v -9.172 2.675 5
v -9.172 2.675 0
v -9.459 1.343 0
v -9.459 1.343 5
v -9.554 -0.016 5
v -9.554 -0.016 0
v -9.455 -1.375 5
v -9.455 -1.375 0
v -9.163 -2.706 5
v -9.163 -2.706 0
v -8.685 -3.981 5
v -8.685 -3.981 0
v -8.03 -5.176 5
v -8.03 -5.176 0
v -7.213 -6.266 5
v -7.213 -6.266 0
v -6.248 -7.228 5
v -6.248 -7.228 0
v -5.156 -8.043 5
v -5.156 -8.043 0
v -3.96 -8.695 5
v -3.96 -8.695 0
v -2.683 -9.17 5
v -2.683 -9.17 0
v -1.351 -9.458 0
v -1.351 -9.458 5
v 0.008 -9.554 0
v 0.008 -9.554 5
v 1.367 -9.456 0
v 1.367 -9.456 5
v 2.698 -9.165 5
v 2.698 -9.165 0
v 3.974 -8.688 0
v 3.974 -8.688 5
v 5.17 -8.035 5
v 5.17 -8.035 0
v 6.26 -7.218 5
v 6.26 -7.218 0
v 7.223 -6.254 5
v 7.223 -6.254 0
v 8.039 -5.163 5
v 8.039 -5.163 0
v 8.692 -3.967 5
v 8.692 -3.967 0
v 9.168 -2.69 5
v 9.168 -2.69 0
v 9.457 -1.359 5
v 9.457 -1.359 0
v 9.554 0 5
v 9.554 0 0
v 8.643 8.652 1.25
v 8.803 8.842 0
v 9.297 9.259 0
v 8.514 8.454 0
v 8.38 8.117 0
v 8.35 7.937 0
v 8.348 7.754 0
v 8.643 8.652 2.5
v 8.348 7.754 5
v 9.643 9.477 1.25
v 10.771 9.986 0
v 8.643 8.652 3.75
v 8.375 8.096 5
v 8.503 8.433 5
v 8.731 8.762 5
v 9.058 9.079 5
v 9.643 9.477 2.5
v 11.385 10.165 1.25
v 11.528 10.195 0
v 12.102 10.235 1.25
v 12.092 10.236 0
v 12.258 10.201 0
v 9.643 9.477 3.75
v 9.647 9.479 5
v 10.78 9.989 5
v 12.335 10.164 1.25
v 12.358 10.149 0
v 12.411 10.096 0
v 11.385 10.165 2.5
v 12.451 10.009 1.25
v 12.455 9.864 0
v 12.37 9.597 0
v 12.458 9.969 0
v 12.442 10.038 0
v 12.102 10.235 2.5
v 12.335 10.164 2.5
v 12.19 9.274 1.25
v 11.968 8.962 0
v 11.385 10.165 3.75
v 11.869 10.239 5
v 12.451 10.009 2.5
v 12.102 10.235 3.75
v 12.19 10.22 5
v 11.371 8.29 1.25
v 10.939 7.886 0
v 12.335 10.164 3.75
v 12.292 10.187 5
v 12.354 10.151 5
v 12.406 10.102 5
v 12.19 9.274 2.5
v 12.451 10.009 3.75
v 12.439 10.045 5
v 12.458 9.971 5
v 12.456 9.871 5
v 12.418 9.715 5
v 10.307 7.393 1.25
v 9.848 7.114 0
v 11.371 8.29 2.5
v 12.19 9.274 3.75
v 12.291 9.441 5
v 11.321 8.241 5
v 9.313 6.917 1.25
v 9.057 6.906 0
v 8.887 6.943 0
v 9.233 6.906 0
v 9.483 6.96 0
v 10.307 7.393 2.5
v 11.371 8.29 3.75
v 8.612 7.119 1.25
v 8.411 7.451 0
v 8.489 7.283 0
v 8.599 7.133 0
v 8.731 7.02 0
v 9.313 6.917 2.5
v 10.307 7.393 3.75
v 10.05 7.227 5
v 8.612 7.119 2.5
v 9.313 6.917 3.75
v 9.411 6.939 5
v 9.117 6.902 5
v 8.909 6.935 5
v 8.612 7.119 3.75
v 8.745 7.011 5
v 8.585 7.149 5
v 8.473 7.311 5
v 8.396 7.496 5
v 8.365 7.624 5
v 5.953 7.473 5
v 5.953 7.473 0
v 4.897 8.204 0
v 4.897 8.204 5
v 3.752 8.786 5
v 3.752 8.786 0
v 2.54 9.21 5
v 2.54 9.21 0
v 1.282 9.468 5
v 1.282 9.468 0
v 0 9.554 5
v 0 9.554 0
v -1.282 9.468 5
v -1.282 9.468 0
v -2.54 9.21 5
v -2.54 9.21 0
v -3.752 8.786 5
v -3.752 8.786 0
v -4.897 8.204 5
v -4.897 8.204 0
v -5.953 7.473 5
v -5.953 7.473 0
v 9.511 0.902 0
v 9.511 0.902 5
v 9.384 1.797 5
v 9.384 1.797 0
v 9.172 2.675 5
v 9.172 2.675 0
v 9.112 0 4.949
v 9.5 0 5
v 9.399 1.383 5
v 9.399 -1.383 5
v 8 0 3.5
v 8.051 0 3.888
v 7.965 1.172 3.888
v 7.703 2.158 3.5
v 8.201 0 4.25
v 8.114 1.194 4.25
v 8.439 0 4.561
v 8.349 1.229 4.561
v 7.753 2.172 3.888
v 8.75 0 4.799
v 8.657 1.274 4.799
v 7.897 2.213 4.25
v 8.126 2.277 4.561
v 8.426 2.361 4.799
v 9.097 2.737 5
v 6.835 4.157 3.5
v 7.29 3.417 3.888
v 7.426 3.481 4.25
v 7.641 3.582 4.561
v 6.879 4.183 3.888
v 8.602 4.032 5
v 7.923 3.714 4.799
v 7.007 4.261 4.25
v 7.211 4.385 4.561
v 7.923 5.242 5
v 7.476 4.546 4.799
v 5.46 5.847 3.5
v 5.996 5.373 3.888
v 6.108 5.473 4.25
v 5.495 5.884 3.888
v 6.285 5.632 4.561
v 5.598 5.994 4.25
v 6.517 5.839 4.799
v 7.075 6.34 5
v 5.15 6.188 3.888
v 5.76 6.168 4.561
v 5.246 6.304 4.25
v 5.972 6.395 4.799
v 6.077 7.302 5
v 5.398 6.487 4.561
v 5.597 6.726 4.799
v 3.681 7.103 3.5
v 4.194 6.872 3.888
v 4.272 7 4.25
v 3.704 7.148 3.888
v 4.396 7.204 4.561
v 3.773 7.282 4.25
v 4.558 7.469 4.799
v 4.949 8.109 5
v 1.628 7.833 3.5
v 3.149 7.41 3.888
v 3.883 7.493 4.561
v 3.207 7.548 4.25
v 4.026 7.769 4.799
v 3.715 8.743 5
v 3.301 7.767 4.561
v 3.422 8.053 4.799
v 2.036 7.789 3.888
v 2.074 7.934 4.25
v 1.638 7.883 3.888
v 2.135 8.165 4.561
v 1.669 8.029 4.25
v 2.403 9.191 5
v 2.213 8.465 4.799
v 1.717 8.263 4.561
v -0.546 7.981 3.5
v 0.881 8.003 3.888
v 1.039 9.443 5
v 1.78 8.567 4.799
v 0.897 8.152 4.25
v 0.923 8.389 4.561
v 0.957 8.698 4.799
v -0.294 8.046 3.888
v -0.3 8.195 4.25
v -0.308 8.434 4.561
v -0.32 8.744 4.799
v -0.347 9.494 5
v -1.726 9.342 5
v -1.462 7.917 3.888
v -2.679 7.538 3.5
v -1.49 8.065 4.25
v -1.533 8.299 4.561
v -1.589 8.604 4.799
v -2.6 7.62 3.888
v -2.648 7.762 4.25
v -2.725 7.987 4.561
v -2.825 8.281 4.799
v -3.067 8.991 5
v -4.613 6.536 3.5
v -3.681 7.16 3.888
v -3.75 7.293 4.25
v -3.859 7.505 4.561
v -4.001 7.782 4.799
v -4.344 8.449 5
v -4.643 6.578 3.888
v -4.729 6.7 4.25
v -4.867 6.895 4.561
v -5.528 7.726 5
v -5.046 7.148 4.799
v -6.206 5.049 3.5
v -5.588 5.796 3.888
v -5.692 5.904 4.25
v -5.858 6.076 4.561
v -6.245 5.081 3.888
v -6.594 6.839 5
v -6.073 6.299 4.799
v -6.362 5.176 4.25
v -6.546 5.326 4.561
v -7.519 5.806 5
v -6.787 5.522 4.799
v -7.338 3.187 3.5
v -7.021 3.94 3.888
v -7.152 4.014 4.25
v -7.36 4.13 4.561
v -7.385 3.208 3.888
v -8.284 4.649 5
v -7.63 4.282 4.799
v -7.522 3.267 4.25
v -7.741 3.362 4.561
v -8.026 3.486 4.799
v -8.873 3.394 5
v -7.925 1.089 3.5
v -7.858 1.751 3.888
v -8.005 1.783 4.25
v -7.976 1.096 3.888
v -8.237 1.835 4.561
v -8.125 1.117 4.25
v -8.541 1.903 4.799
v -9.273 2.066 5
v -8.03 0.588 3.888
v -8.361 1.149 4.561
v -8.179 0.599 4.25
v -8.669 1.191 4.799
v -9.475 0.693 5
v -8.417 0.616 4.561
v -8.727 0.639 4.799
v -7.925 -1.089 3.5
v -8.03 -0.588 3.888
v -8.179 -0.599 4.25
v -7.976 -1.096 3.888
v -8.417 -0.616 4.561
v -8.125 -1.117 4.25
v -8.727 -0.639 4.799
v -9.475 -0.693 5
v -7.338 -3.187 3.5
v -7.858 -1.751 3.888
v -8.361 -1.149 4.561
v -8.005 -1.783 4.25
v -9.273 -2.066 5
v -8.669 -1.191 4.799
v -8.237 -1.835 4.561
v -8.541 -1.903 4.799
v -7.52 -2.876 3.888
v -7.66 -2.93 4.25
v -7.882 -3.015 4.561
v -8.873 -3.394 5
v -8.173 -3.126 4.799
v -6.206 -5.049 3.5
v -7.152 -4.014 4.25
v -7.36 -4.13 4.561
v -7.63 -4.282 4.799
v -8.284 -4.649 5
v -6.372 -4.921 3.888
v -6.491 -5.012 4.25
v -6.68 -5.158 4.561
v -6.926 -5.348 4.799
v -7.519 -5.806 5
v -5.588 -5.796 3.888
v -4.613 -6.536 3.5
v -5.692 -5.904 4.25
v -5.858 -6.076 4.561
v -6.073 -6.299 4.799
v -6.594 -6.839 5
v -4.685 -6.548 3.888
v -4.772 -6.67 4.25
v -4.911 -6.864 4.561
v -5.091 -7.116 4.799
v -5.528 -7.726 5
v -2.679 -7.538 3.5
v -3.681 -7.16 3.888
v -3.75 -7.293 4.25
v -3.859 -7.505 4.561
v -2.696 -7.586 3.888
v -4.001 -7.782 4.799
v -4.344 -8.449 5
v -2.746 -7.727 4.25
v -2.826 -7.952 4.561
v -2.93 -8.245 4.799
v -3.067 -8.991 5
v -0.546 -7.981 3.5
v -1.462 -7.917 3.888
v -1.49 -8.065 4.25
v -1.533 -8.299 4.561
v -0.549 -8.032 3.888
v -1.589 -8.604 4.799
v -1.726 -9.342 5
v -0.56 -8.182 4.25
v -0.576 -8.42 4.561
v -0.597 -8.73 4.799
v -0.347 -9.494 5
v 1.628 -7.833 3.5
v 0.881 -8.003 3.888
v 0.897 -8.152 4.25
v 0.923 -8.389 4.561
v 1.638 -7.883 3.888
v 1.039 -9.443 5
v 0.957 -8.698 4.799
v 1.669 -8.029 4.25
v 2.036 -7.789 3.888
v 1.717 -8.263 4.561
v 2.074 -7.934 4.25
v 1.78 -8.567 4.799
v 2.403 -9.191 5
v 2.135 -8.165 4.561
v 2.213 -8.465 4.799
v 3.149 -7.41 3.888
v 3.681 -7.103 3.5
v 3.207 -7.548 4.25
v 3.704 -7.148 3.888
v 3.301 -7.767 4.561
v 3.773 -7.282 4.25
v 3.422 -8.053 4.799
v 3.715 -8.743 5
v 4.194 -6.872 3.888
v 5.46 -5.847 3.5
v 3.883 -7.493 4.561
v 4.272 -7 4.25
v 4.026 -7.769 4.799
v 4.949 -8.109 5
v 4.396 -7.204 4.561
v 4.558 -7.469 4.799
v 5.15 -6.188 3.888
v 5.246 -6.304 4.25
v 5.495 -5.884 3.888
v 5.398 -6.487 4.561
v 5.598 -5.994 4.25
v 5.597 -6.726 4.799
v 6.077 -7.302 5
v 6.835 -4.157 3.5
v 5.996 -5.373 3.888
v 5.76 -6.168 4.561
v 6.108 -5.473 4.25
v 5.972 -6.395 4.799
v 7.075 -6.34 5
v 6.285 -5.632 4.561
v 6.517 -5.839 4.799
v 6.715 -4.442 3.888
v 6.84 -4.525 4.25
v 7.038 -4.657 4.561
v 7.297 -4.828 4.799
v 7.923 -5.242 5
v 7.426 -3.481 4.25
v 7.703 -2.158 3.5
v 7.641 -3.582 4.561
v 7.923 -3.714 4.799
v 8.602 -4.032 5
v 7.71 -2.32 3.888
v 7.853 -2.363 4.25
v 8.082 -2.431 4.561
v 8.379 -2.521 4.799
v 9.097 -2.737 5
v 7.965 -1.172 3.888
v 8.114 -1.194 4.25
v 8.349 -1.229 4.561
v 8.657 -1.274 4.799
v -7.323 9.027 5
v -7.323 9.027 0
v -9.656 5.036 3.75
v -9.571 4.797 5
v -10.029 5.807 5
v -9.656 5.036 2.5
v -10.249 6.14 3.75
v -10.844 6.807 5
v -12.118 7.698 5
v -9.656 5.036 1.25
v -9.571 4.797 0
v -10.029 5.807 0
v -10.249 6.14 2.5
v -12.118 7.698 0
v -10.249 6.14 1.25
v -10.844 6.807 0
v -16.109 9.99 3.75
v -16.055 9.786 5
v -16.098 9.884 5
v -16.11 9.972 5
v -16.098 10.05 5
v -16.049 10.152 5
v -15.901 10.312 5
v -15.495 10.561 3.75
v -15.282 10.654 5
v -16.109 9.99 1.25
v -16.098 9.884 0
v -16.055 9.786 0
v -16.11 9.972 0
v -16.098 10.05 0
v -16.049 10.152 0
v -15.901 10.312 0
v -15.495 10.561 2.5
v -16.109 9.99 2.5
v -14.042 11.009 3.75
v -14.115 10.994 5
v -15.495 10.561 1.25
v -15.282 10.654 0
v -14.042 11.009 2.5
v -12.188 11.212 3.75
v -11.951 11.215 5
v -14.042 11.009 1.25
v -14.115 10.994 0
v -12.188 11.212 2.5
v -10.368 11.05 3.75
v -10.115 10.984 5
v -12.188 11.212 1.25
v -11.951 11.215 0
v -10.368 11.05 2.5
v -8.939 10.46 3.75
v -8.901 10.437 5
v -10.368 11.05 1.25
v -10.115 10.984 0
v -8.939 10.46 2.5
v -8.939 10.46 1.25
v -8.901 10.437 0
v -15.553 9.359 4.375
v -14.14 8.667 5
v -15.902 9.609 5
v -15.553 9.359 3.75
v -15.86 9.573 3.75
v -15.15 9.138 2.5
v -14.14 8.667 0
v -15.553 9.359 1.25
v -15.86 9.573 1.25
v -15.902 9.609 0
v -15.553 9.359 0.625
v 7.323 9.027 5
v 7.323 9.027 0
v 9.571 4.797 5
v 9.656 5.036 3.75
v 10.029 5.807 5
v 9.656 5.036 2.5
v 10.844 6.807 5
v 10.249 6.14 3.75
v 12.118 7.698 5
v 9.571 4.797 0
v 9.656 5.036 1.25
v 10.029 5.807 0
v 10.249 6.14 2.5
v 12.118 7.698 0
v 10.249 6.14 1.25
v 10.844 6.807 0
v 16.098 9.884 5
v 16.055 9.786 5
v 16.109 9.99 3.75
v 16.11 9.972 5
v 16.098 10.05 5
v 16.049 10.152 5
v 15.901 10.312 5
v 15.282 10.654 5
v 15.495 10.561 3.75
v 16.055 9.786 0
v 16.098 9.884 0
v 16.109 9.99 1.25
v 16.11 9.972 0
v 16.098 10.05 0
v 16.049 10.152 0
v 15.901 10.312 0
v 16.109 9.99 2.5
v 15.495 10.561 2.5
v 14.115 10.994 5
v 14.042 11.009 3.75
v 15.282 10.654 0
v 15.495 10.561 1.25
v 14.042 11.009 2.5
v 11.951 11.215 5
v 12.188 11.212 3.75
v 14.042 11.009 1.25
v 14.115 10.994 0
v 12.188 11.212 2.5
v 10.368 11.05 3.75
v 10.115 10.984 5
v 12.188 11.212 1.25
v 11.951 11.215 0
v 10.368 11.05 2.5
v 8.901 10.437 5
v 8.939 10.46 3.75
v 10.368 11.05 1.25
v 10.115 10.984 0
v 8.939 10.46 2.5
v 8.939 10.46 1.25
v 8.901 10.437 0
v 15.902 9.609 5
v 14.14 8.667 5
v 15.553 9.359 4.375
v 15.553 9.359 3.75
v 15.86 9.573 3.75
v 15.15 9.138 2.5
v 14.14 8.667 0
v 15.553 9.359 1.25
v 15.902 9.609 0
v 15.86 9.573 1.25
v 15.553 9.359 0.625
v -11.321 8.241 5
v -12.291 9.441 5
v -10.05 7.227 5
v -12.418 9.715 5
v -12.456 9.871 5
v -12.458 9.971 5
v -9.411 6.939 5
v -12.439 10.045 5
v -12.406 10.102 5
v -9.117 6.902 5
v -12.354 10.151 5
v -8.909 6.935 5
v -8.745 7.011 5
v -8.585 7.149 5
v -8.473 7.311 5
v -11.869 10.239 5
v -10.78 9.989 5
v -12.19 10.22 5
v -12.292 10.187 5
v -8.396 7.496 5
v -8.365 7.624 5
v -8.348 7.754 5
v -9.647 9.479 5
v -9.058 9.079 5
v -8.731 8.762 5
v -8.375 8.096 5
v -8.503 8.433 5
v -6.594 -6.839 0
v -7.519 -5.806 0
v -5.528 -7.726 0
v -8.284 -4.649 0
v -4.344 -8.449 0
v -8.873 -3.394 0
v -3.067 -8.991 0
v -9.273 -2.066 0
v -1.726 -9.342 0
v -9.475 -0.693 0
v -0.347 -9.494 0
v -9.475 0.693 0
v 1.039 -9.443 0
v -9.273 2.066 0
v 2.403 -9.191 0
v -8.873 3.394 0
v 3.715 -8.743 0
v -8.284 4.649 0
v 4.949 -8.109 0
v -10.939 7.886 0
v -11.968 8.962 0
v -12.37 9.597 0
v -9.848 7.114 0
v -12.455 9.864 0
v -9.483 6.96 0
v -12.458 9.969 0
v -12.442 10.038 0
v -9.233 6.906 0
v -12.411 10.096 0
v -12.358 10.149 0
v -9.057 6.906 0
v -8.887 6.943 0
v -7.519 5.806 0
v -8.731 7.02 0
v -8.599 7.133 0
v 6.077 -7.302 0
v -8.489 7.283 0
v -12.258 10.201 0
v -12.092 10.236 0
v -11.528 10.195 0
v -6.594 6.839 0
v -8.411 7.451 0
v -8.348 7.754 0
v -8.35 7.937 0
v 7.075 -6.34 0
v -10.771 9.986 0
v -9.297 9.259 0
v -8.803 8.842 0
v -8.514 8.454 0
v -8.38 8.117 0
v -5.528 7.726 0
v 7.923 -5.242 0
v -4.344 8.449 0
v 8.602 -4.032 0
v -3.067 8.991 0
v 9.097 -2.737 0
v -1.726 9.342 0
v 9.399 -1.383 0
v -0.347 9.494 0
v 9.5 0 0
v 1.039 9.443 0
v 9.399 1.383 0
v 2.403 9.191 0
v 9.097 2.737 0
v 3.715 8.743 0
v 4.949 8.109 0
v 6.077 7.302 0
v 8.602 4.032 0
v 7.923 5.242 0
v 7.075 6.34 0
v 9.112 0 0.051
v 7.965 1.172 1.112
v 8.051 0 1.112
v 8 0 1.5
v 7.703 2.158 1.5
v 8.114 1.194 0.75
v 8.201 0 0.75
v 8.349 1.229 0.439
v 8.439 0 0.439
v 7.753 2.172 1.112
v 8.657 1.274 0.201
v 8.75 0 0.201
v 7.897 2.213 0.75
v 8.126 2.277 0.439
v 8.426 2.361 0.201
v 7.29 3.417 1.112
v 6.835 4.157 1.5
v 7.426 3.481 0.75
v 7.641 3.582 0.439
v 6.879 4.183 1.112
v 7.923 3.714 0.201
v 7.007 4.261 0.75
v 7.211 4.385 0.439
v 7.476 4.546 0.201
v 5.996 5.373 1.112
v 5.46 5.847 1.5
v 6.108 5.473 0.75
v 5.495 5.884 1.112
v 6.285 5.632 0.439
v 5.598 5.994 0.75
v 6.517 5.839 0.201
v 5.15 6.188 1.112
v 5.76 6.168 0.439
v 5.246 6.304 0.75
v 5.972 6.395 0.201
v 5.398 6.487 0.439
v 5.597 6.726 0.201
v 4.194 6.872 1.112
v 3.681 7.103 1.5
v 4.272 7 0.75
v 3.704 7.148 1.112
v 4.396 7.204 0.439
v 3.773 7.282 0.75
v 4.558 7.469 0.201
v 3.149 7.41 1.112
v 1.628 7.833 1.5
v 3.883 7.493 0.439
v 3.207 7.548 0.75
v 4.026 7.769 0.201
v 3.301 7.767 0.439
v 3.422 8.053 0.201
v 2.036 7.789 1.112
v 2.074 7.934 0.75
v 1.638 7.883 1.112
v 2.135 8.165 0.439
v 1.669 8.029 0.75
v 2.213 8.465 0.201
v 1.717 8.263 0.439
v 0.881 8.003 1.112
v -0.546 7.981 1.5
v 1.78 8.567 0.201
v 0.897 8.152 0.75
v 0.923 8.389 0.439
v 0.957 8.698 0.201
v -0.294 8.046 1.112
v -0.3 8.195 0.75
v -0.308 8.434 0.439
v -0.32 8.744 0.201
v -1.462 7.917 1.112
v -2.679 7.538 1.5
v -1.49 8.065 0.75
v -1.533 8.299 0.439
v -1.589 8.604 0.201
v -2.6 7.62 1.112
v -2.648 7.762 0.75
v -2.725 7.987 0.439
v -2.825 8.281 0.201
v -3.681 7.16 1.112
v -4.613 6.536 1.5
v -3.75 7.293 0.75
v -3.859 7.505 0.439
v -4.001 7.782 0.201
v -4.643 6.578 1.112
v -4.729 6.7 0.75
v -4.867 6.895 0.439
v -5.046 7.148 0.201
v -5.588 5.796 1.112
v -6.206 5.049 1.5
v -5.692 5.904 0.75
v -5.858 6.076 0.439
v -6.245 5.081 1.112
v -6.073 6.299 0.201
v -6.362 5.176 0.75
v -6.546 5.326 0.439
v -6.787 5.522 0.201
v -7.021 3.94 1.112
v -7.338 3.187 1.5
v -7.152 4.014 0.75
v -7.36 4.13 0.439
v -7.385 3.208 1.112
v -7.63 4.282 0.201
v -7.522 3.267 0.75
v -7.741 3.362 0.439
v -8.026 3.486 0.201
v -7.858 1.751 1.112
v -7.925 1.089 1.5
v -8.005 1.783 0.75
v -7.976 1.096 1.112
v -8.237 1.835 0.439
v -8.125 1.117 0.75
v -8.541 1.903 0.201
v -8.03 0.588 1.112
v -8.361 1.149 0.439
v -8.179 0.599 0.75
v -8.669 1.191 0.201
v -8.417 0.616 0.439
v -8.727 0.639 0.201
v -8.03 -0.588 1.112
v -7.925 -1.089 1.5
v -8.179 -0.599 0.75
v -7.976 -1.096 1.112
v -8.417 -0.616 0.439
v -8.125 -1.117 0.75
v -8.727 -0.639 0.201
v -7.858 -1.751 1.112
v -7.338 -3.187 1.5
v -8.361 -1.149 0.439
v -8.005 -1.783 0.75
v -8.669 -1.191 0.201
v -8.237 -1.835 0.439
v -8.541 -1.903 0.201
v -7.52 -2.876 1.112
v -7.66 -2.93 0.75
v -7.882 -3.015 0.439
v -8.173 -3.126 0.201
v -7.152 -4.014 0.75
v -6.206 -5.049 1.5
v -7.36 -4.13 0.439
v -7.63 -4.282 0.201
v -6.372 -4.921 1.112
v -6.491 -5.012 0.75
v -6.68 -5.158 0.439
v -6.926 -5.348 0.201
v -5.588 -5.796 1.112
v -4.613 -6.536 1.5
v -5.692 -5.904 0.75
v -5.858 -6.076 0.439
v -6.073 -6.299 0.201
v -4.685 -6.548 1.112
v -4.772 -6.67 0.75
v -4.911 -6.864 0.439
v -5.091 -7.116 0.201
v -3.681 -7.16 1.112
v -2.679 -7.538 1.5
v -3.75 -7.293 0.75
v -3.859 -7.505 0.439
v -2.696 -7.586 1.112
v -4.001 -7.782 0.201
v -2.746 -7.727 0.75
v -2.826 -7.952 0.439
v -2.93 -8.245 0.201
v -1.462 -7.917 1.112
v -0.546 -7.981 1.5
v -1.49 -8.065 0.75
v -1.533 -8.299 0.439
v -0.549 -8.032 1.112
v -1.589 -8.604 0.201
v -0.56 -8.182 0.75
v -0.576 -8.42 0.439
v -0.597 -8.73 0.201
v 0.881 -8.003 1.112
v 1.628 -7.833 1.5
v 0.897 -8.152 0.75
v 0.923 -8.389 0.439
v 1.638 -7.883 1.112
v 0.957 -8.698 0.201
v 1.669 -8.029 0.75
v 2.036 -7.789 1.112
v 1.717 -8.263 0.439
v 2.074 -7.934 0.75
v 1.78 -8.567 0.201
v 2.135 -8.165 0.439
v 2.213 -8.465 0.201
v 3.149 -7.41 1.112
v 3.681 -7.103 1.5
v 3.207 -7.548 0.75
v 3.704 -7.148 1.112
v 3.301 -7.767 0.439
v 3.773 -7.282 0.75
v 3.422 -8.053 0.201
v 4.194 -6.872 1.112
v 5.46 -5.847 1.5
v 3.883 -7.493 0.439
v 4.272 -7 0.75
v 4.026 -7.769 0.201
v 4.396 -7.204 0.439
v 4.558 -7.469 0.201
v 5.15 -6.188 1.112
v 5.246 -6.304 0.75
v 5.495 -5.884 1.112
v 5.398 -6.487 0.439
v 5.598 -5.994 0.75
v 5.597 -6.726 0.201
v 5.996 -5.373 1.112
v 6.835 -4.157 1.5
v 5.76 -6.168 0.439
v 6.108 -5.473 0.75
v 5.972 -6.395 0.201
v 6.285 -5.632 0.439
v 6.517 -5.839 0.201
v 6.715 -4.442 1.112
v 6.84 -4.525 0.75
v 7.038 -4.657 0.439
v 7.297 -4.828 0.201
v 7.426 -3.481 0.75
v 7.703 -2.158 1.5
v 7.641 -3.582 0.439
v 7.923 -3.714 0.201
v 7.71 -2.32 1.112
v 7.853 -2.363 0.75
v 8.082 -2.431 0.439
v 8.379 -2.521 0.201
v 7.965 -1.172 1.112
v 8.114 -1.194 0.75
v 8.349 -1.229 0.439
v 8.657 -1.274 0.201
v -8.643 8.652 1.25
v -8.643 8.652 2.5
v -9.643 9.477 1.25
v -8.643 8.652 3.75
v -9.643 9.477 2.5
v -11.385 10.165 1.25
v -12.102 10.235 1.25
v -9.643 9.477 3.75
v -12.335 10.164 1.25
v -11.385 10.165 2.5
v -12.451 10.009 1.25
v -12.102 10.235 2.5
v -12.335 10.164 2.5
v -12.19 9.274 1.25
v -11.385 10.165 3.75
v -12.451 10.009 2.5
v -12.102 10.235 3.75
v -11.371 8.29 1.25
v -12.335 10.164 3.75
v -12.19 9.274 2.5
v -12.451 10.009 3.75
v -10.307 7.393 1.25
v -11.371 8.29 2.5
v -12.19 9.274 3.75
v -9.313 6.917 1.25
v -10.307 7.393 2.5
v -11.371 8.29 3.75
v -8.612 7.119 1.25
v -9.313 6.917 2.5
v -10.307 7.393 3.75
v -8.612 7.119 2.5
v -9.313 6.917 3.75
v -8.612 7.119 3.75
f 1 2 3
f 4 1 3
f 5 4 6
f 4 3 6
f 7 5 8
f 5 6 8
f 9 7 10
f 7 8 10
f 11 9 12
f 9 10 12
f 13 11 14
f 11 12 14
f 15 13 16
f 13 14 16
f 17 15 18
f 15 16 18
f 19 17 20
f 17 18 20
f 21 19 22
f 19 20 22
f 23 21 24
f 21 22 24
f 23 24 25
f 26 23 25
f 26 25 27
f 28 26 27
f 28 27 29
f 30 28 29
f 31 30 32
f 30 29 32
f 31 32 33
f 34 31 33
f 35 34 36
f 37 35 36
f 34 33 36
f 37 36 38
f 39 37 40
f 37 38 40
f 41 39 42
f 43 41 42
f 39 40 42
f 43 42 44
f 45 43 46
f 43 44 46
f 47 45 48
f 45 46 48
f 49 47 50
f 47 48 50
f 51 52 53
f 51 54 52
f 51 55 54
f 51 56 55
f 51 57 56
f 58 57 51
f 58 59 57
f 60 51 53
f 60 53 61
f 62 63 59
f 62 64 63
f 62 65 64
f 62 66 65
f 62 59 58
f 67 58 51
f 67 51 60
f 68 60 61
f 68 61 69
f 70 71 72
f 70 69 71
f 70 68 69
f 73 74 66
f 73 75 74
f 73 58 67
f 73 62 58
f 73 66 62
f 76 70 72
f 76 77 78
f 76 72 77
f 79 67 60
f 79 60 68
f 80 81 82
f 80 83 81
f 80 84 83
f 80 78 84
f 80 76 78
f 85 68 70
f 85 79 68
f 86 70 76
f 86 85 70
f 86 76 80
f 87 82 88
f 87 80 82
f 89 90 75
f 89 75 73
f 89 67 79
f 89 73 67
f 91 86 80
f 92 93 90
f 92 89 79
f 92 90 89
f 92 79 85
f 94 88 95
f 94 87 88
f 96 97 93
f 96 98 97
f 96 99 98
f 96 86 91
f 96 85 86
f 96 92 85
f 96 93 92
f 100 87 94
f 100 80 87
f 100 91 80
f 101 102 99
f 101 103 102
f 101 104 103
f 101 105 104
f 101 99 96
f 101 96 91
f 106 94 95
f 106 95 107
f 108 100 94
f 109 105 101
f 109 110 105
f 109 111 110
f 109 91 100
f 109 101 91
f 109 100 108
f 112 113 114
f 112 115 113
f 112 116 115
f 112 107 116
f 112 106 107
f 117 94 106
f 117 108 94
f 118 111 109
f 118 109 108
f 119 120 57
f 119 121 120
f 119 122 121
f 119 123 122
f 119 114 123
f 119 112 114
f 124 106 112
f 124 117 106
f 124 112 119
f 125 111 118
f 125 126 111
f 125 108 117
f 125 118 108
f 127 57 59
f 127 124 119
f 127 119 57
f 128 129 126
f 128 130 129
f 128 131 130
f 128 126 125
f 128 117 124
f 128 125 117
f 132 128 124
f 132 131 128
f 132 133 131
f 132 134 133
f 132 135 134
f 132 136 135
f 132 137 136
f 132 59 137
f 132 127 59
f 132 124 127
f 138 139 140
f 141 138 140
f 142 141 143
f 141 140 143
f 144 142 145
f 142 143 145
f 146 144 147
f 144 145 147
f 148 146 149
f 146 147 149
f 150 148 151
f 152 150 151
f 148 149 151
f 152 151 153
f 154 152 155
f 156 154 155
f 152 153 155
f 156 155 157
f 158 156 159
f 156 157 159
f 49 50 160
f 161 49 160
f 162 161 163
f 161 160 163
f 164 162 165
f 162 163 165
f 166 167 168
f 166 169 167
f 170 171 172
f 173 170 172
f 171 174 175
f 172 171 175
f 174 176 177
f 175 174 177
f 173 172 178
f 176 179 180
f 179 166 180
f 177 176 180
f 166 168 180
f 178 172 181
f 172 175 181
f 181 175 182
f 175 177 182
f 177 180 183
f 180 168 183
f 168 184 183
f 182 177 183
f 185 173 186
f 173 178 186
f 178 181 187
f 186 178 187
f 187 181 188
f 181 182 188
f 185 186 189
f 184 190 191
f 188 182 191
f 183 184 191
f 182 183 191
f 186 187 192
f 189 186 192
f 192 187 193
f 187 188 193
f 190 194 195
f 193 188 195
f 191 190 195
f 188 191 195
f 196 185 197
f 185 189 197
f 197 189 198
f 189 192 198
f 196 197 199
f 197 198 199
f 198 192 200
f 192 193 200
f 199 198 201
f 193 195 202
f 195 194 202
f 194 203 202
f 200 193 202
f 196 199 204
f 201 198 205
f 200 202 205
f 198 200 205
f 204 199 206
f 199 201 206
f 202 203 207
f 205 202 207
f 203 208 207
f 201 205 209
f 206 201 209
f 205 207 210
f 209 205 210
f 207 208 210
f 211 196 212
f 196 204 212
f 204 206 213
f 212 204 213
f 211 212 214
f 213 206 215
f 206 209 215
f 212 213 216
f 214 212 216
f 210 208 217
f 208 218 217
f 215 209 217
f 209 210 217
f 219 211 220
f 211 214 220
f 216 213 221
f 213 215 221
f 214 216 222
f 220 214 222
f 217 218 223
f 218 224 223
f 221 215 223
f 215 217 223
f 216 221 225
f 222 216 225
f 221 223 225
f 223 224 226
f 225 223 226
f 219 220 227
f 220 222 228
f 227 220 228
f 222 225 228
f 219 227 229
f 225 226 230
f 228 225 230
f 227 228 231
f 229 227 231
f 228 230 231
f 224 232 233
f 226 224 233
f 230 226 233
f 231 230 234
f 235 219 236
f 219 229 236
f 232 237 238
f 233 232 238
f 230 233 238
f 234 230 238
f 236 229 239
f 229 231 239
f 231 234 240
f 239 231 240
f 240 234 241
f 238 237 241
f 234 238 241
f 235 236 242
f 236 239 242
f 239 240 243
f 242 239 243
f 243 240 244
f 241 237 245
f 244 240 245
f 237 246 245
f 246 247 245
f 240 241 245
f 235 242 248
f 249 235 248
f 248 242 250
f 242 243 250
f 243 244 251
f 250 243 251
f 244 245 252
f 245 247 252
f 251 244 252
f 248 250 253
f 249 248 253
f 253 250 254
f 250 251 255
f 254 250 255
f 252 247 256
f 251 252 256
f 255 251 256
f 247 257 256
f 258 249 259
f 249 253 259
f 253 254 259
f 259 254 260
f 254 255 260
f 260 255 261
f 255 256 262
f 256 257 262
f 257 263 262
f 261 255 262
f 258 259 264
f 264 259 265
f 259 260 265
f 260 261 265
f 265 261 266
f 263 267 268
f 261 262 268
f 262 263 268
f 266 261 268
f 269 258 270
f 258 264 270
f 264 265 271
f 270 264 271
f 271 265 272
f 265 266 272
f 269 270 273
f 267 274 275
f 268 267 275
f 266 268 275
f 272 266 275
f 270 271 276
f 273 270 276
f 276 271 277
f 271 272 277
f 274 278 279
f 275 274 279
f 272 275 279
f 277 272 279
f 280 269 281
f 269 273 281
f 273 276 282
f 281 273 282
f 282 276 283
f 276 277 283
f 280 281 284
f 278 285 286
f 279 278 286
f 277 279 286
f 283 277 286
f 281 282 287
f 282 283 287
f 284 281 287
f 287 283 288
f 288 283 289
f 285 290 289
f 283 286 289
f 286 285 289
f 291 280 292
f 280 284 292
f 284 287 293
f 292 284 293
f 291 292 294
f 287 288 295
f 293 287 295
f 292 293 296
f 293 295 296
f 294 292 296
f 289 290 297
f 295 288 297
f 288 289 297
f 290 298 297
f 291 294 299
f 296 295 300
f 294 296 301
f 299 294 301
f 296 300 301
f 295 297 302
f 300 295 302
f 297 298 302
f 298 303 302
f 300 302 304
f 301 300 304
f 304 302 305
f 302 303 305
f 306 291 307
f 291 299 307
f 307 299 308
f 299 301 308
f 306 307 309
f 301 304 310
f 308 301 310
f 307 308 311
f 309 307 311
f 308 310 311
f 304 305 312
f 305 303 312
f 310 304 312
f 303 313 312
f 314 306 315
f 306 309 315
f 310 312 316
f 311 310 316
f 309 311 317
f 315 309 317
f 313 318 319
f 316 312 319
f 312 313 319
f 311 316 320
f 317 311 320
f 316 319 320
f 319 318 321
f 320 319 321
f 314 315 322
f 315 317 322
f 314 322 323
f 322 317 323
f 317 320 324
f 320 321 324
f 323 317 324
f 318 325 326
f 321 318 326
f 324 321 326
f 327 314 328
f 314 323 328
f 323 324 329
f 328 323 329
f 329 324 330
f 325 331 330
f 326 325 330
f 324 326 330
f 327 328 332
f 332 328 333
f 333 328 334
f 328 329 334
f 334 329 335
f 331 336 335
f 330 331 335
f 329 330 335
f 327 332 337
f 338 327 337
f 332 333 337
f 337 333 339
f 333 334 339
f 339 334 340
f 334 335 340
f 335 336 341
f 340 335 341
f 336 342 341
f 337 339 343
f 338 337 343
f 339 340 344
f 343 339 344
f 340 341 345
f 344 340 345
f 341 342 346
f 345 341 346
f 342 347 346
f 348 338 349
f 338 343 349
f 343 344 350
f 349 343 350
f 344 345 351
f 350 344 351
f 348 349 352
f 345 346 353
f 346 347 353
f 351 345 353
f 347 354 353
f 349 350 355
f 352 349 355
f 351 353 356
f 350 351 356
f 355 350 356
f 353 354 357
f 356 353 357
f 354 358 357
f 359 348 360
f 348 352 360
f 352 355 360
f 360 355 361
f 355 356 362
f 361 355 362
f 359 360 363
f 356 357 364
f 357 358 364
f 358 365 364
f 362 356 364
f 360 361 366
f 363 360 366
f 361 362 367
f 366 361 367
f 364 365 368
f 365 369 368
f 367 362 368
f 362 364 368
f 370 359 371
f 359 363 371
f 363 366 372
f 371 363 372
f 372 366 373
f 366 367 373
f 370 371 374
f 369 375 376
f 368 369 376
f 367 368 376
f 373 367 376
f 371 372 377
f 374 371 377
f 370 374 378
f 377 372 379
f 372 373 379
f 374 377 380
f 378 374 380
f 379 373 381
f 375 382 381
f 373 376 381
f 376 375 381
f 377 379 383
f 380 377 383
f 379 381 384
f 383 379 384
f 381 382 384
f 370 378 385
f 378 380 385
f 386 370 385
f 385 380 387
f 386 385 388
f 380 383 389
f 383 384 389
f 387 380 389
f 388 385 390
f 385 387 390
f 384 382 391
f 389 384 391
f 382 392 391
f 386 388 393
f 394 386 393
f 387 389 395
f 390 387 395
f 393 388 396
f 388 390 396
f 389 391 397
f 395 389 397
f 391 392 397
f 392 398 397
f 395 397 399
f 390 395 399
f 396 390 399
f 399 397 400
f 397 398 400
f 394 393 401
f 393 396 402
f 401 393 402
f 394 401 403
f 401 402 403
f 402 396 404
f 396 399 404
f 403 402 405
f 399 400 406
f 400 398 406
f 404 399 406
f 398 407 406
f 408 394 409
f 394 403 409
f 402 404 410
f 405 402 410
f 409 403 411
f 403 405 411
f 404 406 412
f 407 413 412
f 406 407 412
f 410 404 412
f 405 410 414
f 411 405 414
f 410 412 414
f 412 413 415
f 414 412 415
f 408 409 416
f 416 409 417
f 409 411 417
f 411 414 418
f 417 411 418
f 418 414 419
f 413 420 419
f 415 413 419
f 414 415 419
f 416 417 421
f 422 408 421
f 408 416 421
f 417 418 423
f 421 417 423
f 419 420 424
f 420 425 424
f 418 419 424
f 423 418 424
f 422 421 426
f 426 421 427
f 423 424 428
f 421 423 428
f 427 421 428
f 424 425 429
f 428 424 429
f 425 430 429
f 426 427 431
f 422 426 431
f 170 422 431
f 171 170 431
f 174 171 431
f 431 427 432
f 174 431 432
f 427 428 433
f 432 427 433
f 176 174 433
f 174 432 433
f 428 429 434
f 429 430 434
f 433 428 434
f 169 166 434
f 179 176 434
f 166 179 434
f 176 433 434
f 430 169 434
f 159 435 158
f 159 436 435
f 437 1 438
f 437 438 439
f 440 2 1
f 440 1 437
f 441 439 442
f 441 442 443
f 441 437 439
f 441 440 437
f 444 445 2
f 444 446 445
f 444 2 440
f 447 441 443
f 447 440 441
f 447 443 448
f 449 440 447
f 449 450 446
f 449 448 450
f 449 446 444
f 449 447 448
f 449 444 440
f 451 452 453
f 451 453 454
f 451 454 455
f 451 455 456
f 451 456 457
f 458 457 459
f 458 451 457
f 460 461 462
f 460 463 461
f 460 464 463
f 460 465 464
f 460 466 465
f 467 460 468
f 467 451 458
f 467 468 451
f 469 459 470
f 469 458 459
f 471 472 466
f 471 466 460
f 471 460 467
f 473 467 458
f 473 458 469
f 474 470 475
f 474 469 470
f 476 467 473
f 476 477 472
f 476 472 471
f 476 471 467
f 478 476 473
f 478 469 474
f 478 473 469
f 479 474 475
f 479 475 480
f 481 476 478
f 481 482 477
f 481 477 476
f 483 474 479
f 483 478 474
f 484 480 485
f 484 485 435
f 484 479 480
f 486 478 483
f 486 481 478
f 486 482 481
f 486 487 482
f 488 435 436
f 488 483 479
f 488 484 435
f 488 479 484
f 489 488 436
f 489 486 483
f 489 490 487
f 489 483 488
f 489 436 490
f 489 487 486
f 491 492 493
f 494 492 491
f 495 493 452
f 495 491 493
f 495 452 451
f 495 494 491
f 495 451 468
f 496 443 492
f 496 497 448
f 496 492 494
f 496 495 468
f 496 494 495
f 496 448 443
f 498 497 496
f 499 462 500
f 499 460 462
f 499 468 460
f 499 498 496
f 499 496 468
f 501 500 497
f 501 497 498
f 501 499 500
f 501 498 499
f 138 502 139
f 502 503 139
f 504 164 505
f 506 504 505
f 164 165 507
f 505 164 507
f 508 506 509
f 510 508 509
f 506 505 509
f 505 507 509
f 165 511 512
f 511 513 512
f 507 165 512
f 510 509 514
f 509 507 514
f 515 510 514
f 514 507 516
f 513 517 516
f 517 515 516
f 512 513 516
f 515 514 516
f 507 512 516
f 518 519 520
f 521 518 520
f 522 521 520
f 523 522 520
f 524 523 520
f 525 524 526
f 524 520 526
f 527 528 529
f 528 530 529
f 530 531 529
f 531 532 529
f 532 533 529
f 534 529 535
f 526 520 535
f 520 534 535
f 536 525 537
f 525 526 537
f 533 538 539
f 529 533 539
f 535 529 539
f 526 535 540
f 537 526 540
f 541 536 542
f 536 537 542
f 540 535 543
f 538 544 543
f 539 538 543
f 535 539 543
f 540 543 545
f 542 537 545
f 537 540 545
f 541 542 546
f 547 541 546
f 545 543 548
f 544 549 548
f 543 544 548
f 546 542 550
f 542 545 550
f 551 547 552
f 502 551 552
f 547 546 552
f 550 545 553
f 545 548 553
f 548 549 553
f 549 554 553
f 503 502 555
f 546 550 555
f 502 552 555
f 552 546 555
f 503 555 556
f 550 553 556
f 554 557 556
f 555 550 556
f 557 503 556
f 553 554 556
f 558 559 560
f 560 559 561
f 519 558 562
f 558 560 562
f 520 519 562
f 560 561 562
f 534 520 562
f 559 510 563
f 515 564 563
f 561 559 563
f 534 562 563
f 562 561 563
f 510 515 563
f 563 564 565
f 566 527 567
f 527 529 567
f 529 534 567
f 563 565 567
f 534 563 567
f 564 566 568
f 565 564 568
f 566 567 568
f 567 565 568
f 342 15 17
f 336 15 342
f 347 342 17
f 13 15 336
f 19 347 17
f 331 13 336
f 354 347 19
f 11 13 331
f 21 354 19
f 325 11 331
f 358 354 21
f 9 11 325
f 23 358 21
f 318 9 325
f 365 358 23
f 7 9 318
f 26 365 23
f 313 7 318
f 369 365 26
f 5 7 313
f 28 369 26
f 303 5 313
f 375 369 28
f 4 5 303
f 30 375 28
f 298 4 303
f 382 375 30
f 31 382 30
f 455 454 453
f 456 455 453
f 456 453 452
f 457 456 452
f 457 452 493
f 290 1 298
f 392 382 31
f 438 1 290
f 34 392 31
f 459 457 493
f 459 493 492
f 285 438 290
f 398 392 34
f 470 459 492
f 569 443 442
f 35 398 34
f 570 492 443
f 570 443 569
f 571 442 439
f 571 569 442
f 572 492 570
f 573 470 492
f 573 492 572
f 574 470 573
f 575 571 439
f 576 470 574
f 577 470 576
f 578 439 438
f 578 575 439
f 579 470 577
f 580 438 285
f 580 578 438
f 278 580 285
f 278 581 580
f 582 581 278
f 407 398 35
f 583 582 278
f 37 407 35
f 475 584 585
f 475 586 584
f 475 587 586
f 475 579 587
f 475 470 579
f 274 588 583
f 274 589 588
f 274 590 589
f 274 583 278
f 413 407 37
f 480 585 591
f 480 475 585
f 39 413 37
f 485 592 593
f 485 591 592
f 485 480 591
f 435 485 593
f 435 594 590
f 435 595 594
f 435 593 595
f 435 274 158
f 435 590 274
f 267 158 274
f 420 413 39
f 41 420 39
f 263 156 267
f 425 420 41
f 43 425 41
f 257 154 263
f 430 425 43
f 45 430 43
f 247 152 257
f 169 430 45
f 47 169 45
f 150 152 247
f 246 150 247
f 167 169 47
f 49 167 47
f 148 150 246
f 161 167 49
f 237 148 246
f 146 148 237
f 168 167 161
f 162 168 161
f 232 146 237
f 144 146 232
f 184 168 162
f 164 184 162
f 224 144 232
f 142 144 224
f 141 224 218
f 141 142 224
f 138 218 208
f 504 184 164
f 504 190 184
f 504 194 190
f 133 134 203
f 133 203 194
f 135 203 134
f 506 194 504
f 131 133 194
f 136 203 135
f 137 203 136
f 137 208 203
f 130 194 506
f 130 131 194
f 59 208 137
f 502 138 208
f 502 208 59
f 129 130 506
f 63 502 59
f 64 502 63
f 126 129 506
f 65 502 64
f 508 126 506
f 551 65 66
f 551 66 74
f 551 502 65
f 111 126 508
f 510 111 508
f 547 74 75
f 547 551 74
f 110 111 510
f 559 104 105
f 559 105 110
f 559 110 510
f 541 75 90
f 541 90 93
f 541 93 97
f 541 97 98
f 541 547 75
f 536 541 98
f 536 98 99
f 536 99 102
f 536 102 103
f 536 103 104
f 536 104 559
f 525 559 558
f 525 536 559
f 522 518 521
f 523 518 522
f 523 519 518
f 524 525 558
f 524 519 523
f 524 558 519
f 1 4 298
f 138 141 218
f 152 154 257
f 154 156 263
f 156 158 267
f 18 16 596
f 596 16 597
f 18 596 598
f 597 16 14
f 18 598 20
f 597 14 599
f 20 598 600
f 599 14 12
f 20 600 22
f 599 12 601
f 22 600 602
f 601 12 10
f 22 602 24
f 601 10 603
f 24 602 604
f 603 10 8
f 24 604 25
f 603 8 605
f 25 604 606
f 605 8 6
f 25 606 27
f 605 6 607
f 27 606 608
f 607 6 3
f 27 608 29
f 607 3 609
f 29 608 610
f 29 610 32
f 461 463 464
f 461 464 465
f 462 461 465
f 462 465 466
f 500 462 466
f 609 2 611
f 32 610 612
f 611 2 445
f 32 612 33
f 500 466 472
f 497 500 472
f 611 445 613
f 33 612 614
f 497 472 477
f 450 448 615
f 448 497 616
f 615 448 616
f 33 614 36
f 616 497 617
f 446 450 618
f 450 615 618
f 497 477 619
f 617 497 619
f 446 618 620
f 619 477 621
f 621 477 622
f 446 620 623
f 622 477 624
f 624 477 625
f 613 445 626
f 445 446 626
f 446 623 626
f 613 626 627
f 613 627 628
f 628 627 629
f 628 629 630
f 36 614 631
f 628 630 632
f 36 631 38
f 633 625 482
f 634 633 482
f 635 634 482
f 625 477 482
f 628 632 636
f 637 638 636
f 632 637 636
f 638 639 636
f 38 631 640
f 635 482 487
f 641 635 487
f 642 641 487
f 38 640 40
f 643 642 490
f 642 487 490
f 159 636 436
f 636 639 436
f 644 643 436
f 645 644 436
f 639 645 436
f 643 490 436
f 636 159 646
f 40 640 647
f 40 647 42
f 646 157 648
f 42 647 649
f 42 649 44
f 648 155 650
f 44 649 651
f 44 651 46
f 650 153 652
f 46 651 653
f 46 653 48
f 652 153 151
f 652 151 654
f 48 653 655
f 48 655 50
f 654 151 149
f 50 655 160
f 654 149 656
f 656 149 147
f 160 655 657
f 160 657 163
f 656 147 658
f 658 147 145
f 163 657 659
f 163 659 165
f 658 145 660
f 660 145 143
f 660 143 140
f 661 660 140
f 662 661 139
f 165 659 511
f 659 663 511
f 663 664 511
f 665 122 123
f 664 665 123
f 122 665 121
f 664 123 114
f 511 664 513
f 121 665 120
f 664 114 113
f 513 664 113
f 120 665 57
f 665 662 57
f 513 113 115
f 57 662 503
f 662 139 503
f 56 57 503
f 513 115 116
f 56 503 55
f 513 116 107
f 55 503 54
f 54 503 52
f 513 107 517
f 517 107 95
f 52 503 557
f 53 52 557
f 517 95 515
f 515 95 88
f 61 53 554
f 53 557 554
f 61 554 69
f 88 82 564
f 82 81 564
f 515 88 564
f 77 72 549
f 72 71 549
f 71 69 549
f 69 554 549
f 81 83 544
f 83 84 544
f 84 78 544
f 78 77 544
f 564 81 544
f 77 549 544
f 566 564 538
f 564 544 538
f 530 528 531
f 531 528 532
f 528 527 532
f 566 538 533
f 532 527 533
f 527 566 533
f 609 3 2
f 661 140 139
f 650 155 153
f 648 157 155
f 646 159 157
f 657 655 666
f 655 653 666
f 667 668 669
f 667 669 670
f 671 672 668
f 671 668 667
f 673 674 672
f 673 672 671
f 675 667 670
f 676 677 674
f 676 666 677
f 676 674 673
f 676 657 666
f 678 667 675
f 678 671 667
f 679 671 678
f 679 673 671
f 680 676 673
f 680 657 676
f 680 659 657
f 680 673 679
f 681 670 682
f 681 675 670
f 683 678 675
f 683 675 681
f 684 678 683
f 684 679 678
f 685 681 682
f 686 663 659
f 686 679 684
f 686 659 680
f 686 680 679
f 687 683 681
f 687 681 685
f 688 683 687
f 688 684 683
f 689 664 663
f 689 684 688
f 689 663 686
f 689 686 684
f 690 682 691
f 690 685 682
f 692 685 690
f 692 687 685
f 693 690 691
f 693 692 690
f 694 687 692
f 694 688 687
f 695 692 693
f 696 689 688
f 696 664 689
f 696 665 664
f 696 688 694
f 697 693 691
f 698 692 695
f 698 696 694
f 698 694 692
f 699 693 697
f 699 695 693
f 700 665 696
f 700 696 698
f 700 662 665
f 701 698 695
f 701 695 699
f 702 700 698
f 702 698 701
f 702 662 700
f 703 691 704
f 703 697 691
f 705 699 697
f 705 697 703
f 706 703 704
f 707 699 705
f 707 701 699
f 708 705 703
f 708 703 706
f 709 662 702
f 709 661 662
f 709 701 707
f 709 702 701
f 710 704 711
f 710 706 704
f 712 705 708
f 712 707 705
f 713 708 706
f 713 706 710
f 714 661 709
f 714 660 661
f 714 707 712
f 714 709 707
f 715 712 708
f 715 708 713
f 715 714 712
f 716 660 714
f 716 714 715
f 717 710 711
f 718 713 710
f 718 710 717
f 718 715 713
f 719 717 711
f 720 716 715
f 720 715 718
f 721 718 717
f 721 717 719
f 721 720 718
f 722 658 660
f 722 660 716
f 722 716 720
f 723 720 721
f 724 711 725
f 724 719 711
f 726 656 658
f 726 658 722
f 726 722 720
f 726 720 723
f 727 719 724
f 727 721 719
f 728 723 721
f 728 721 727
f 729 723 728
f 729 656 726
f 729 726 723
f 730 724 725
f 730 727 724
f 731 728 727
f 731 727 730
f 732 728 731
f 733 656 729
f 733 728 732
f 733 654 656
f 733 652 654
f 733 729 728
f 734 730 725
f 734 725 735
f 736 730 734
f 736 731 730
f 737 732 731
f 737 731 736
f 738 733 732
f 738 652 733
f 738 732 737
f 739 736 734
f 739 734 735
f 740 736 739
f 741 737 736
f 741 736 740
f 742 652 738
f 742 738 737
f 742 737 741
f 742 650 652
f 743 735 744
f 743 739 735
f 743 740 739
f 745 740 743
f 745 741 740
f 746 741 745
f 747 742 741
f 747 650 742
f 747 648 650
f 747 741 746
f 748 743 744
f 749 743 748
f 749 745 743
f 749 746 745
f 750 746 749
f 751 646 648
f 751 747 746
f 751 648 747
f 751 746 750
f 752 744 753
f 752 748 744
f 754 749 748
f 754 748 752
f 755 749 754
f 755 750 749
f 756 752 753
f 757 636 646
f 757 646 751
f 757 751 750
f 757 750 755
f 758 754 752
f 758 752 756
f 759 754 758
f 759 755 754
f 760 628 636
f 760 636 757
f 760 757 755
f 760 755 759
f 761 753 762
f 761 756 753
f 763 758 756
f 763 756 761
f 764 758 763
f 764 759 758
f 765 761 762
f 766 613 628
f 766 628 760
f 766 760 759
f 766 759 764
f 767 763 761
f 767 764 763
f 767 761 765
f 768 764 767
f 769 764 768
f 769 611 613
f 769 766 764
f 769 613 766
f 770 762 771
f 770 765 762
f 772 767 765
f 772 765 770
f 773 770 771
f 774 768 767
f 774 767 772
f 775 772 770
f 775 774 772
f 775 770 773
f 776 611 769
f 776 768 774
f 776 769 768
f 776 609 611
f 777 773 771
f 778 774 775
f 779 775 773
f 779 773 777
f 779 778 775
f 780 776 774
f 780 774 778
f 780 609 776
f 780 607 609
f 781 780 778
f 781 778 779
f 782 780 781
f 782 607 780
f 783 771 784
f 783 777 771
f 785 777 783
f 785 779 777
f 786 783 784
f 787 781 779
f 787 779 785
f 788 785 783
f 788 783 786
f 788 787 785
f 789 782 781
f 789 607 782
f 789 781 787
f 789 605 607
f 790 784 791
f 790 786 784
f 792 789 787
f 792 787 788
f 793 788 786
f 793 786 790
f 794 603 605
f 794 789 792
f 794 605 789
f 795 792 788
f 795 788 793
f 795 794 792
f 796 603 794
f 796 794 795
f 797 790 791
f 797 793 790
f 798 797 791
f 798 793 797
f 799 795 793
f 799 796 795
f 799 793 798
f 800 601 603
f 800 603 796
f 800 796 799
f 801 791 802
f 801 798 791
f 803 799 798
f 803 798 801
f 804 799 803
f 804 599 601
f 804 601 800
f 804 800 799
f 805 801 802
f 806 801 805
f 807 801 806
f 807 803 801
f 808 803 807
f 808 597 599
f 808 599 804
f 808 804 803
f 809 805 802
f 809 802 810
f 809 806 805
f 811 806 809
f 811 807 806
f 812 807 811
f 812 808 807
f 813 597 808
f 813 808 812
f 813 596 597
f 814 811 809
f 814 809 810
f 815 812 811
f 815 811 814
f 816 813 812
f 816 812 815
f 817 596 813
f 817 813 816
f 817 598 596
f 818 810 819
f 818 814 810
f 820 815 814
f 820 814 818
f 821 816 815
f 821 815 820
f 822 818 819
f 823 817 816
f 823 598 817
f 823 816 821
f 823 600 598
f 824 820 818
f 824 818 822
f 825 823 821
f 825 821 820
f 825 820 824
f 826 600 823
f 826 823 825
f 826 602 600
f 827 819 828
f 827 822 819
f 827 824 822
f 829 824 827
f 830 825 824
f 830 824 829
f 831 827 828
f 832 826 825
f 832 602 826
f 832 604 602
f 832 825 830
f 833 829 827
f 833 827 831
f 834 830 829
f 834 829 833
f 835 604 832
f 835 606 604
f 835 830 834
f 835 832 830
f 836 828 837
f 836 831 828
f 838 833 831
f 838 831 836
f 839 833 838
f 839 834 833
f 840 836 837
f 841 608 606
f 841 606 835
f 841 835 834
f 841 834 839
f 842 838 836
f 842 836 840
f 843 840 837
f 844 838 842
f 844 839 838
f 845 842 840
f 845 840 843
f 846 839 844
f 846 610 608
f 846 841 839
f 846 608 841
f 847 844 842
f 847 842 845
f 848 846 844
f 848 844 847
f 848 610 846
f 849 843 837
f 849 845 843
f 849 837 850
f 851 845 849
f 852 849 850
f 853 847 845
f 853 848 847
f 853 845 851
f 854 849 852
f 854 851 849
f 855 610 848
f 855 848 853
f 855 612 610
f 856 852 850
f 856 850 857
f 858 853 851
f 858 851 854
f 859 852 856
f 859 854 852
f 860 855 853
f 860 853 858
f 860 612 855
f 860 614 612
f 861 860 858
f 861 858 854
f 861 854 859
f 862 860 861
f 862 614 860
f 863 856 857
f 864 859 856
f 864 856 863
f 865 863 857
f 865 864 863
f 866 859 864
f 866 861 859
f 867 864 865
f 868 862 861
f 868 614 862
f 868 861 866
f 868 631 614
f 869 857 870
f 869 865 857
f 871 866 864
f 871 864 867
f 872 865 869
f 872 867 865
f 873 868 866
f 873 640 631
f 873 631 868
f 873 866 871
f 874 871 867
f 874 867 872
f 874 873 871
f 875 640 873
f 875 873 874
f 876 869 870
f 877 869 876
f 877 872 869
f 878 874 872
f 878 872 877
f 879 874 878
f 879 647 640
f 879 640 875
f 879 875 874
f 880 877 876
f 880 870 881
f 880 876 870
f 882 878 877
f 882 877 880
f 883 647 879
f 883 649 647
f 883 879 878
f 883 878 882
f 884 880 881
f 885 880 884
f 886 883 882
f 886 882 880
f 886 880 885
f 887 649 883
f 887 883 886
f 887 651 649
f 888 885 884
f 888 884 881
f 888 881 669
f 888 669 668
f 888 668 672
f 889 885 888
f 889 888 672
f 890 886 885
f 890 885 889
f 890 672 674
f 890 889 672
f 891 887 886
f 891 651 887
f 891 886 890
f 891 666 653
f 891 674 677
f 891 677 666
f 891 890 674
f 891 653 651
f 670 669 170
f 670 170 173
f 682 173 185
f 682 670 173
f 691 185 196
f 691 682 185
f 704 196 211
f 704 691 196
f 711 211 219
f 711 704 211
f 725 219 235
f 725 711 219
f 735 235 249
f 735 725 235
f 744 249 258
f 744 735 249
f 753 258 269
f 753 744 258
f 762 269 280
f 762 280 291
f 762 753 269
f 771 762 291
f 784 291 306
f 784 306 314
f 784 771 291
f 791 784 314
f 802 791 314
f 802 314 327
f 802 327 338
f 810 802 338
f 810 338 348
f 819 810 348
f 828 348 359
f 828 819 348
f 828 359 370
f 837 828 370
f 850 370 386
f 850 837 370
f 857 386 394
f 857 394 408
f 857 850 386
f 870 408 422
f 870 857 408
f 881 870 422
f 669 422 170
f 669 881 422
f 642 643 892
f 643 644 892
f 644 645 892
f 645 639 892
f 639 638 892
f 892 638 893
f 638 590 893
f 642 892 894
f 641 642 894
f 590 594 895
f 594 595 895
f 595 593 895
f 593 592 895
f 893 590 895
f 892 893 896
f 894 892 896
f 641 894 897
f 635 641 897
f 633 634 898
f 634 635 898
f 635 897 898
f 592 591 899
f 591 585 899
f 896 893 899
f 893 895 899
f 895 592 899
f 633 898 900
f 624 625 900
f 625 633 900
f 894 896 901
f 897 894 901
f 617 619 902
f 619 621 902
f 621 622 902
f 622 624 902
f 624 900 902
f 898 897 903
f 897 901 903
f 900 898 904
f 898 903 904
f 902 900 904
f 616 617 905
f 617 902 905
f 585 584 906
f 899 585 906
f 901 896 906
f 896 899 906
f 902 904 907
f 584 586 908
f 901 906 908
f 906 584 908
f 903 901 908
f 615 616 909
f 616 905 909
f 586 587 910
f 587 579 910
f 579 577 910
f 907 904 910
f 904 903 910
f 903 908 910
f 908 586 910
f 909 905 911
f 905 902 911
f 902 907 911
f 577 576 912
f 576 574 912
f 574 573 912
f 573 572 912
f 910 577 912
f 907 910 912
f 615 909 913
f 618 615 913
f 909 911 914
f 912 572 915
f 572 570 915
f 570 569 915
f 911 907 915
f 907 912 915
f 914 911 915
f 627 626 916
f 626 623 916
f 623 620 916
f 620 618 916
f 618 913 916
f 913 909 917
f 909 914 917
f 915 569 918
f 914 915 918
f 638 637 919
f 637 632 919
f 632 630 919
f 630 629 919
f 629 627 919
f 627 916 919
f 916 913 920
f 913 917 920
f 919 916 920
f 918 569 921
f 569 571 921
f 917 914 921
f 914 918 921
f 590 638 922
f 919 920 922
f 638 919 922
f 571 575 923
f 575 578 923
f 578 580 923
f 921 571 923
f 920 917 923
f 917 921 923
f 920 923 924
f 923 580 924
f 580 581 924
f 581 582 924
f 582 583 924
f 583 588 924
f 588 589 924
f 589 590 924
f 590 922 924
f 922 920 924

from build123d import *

# Parameters (mm, degrees)
F0_R     = 8
F1_DEPTH = 5
F2_R     = 1.5
F4_DEPTH = 25


with BuildPart() as f1:
    # F0 (on Top) → F1 (new body)
    with BuildSketch(Plane.XY):
        with BuildLine():
            ThreePointArc((-9.1720328198, 2.675112995), (-1.3511354861, -9.4581630607), (9.5541831458, 0))
            ThreePointArc((9.5541831458, 0), (9.4581630607, 1.3511354861), (9.1720328198, 2.675112995))
            ThreePointArc((9.1720328198, 2.675112995), (7.9339693007, 5.3230204508), (5.9532705167, 7.4726826334))
            ThreePointArc((5.9532705167, 7.4726826334), (0, 9.5541831458), (-5.9532705167, 7.4726826334))
            ThreePointArc((-5.9532705167, 7.4726826334), (-7.9339693007, 5.3230204508), (-9.1720328198, 2.675112995))
        make_face()
        Circle(F0_R, mode=Mode.SUBTRACT)
        with BuildLine():
            ThreePointArc((5.9532705167, 7.4726826334), (7.9339693007, 5.3230204508), (9.1720328198, 2.675112995))
            add(Edge.make_bspline(
                [(9.1720328198, 2.675112995), (9.3284464817, 4.2498718644), (9.9387125038, 7.700009267), (19.4552807074, 10.0076791333), (9.1586892174, 12.3375744106), (7.2323056025, 8.7735692323), (5.9532705167, 7.4726826334)],
                knots=[0, 0, 0, 0, 0.2356475287, 0.4890090162, 0.7462248812, 1, 1, 1, 1], degree=3))
        make_face()
        with BuildLine():
            add(Edge.make_bspline(
                [(-9.1720328198, 2.675112995), (-9.3284464817, 4.2498718644), (-9.9387125038, 7.700009267), (-19.4552807074, 10.0076791333), (-9.1586892174, 12.3375744106), (-7.2323056025, 8.7735692323), (-5.9532705167, 7.4726826334)],
                knots=[0, 0, 0, 0, 0.2356475287, 0.4890090162, 0.7462248812, 1, 1, 1, 1], degree=3))
            ThreePointArc((-9.1720328198, 2.675112995), (-7.9339693007, 5.3230204508), (-5.9532705167, 7.4726826334))
        make_face()
    extrude(amount=F1_DEPTH)

    # F2
    f2_edges = [f1.edges().sort_by_distance(p)[0] for p in [
        (-8, 0, 5),
        (-8, 0, 0),
    ]]
    fillet(f2_edges, radius=F2_R)

    # F3 (on face) → F4 (cut)
    with BuildSketch(Plane.XY.offset(5)):
        with BuildLine():
            add(Edge.make_bspline(
                [(-8.3483560011, 7.7542406507), (-8.3060933519, 8.3646012431), (-9.2511148134, 9.6539708681), (-14.3571980236, 11.1361375767), (-9.2890488842, 5.9230364747), (-8.3808880361, 7.2844103731), (-8.3483560011, 7.7542406507)],
                knots=[0, 0, 0, 0, 0.2298181492, 0.4944923995, 0.8230955174, 1, 1, 1, 1], degree=3))
        make_face()
        with BuildLine():
            add(Edge.make_bspline(
                [(8.3483560011, 7.7542406507), (8.3060933519, 8.3646012431), (9.2511148134, 9.6539708681), (14.3571980236, 11.1361375767), (9.2890488842, 5.9230364747), (8.3808880361, 7.2844103731), (8.3483560011, 7.7542406507)],
                knots=[0, 0, 0, 0, 0.2298181492, 0.4944923995, 0.8230955174, 1, 1, 1, 1], degree=3))
        make_face()
    extrude(amount=-F4_DEPTH, mode=Mode.SUBTRACT)


solid = f1.part
